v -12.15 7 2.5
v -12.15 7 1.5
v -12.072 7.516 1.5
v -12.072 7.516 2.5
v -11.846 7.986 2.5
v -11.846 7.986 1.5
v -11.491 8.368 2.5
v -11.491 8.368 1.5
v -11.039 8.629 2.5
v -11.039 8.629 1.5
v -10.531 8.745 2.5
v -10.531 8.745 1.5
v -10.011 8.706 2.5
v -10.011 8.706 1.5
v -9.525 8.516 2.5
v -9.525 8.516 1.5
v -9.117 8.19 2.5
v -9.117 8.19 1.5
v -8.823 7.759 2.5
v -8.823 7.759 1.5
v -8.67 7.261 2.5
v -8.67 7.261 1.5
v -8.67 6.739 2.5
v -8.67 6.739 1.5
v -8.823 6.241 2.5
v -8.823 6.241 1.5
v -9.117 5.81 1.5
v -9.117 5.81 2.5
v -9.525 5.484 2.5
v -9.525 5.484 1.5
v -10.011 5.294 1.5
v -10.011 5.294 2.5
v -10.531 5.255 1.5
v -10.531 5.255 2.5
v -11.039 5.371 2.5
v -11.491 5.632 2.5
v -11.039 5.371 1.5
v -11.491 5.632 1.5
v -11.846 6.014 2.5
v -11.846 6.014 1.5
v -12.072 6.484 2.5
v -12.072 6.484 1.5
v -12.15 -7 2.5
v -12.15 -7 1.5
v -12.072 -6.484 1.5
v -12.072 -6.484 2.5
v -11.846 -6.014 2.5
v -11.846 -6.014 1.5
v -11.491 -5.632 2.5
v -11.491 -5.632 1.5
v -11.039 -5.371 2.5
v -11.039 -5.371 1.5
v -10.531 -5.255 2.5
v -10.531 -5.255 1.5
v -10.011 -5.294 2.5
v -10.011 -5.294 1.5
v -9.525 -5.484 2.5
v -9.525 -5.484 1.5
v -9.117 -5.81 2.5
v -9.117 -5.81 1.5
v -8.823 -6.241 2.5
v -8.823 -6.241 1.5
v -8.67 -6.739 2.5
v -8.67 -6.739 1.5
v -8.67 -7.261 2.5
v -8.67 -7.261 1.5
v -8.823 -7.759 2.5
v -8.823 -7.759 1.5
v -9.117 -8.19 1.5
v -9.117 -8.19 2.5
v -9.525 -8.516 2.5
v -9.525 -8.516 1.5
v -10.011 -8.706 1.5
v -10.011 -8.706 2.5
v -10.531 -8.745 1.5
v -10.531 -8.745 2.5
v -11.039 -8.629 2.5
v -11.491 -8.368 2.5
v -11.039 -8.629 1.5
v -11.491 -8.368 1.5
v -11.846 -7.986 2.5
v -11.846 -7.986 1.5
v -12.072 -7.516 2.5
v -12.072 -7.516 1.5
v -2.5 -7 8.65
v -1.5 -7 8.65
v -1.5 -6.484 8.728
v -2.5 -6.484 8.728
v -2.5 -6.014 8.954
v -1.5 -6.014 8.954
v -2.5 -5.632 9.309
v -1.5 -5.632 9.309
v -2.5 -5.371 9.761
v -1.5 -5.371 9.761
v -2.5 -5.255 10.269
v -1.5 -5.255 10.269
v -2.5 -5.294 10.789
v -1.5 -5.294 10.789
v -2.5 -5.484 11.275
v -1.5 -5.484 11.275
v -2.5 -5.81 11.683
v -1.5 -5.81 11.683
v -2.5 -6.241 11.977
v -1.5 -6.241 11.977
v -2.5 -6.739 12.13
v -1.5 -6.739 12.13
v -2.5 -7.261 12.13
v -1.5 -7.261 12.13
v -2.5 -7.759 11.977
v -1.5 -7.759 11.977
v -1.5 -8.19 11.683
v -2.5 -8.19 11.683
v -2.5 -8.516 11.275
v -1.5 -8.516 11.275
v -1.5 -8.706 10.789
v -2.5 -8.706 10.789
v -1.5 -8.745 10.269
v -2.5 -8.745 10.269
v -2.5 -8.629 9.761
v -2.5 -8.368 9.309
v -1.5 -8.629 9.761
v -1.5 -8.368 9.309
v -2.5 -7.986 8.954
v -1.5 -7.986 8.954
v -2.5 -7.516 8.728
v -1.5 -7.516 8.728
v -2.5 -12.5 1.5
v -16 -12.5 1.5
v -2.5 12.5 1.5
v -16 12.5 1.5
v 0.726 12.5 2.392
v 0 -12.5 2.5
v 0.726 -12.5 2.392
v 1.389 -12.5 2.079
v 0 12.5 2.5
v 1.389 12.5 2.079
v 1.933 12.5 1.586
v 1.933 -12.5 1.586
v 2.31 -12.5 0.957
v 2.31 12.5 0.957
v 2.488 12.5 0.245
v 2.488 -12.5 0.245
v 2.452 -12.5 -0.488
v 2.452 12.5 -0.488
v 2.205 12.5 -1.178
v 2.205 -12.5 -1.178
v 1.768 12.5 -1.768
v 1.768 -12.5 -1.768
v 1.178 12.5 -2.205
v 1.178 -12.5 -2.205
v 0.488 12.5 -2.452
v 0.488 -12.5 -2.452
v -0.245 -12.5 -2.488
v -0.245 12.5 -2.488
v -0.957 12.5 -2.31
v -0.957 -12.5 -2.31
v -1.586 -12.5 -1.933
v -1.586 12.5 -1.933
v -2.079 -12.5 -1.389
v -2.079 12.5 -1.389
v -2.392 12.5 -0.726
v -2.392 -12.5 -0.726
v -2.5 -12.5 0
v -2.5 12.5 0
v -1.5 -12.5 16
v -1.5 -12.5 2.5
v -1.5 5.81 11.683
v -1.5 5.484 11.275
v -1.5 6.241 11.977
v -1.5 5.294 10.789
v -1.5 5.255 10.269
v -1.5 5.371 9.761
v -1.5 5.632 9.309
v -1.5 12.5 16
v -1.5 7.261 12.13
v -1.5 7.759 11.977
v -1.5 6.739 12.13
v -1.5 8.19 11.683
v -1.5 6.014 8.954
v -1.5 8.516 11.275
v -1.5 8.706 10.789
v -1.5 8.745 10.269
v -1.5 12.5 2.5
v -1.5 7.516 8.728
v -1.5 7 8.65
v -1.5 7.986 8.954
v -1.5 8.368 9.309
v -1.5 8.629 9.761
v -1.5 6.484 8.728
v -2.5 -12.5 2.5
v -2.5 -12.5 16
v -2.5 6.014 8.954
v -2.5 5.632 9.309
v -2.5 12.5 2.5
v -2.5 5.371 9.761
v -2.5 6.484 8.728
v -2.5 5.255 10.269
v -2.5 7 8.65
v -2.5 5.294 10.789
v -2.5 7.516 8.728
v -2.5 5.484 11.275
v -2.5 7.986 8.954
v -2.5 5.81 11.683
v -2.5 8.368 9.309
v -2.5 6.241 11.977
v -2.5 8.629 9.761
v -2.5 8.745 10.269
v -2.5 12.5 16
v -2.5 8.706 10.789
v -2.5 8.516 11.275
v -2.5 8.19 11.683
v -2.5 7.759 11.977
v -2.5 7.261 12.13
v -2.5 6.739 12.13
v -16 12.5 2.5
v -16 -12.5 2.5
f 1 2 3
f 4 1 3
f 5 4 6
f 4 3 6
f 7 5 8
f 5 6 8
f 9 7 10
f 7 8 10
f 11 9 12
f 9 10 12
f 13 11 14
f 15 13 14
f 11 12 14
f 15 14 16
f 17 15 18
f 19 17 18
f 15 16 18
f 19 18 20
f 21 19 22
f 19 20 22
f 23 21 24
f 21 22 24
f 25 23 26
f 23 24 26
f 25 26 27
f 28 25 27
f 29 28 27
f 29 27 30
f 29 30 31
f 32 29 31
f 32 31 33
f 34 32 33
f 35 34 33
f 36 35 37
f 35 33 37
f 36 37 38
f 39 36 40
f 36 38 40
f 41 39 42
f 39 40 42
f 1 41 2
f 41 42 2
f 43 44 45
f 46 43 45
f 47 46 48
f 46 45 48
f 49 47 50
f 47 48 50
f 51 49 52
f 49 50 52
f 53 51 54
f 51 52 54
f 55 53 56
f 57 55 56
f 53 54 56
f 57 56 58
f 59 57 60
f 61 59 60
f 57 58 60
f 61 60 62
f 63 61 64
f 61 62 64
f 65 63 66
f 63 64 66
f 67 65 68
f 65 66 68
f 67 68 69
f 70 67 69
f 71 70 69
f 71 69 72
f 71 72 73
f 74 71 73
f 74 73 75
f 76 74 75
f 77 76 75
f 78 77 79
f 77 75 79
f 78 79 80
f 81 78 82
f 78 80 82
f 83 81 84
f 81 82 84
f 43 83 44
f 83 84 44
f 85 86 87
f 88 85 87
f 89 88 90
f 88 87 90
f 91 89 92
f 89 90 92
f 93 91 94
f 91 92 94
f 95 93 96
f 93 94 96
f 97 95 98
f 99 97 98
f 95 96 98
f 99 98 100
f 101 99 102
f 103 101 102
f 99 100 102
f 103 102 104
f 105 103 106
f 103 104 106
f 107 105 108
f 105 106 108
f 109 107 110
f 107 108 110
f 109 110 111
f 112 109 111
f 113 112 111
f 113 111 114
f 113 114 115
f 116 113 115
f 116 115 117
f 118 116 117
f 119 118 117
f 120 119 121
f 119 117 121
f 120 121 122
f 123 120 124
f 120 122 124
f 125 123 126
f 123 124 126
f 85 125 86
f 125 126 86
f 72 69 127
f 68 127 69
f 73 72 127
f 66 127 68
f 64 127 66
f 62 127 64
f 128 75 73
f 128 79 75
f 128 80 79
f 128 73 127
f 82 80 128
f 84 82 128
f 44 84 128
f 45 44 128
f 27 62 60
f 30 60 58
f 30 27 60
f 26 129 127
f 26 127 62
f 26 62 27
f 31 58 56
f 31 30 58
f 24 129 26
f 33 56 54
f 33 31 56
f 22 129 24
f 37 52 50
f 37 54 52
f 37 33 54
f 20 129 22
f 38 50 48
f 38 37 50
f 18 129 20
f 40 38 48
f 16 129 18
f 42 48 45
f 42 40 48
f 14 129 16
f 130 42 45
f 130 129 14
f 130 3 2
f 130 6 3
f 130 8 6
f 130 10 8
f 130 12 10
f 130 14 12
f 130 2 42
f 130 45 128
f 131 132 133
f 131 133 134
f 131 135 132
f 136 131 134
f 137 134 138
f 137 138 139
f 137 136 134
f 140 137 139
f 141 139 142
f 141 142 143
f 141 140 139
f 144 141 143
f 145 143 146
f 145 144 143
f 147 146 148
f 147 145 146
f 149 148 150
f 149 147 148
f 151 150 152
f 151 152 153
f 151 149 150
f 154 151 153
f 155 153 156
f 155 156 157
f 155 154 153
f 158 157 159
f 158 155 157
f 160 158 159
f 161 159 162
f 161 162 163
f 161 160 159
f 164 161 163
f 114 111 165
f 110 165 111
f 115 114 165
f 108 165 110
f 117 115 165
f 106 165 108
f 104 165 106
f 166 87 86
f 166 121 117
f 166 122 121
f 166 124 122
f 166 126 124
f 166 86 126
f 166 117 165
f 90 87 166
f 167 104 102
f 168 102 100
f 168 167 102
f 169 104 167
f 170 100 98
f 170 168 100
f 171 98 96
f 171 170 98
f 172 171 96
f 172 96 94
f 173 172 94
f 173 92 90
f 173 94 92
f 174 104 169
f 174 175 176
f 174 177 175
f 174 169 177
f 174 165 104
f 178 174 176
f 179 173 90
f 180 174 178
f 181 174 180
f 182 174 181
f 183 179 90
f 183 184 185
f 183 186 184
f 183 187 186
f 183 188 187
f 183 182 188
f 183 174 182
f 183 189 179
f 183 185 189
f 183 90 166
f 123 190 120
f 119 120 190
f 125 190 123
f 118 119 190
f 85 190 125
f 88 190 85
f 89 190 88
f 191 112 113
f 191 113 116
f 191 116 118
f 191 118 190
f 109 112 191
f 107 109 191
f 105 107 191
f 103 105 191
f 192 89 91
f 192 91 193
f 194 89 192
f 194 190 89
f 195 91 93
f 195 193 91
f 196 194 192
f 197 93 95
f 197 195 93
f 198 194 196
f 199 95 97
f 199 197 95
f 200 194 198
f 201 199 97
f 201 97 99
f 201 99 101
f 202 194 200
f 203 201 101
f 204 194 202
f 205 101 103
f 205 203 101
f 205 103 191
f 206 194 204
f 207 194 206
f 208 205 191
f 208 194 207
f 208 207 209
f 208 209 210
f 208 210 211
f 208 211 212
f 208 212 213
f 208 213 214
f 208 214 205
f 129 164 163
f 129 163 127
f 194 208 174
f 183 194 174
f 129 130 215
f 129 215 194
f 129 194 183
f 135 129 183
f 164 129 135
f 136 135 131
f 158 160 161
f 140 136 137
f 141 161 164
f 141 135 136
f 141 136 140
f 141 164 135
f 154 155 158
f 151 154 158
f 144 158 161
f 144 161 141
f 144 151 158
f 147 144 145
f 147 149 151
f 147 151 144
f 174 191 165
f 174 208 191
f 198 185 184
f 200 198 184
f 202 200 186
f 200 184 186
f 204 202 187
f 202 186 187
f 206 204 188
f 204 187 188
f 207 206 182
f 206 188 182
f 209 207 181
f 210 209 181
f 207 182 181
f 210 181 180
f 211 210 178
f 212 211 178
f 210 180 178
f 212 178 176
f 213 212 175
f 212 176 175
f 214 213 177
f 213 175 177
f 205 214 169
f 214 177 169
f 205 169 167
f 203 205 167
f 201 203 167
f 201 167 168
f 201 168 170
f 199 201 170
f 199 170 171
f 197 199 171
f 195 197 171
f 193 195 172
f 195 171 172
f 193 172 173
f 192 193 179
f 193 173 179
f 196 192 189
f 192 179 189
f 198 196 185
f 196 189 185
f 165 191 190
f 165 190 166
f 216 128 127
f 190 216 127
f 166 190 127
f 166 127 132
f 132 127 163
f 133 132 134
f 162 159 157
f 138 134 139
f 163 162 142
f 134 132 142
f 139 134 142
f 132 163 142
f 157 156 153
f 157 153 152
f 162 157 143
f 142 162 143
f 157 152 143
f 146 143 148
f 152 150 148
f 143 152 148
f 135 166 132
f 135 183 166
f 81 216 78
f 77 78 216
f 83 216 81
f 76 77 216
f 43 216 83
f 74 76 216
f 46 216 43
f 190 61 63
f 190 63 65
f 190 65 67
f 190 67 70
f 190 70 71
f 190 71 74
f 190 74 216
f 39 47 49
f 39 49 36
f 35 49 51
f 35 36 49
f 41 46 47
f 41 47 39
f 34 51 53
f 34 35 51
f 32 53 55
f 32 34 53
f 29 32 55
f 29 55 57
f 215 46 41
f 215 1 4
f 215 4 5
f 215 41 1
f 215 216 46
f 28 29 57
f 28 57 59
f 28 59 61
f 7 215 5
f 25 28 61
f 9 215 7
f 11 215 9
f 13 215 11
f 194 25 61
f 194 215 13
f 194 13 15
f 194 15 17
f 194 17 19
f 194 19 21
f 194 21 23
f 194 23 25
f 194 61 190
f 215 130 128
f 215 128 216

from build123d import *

# Parameters (mm, degrees)
EXTRUDE_1_DEPTH     = 12.5
SKETCH_4_R          = 2.121320344
EXTRUDE_3_DEPTH     = 25
SKETCH_5_R          = 1.75
CUT_EXTRUDE_1_DEPTH = 1
SKETCH_6_R          = 1.75
CUT_EXTRUDE_2_DEPTH = 1


with BuildPart() as part:
    # 草图1 → 凸台-拉伸1 (new, symmetric)
    with BuildSketch(Plane(origin=(0, 0, 0), x_dir=(1, 0, 0), z_dir=(0, 1, 0))):
        with BuildLine():
            ThreePointArc((0, -2.5), (1.767766953, 1.767766953), (-2.5, 0))
            Line((-2.5, 0), (-2.5, -1.5))
            Line((-2.5, -1.5), (-16, -1.5))
            Line((-16, -1.5), (-16, -2.5))
            Line((-16, -2.5), (-2.5, -2.5))
            Line((-2.5, -2.5), (-2.5, -16))
            Line((-2.5, -16), (-1.5, -16))
            Line((-1.5, -16), (-1.5, -2.5))
            Line((-1.5, -2.5), (0, -2.5))
        make_face()
        with BuildLine():
            ThreePointArc((-1.5, 0), (1.060660172, 1.060660172), (0, -1.5))
            Line((0, -1.5), (-1.5, -1.5))
            Line((-1.5, -1.5), (-1.5, 0))
        make_face(mode=Mode.SUBTRACT)
    extrude(amount=EXTRUDE_1_DEPTH, both=True)

    # 草图4 → 凸台-拉伸3 (add)
    with BuildSketch(Plane(origin=(0, 12.5, 0), x_dir=(1, 0, 0), z_dir=(0, 1, 0))):
        Circle(SKETCH_4_R)
    extrude(amount=-EXTRUDE_3_DEPTH)

    # 草图5 → 切除-拉伸1 (cut)
    with BuildSketch(Plane(origin=(0, 0, 1.5), x_dir=(-1, 0, 0), z_dir=(0, 0, -1))):
        with Locations((10.4, -7)):
            Circle(SKETCH_5_R)
        with Locations((10.4, 7)):
            Circle(SKETCH_5_R)
    extrude(amount=-CUT_EXTRUDE_1_DEPTH, mode=Mode.SUBTRACT)

    # 草图6 → 切除-拉伸2 (cut)
    with BuildSketch(Plane(origin=(-1.5, 0, 0), x_dir=(0, 0, -1), z_dir=(1, 0, 0))):
        with Locations((-10.4, -7)):
            Circle(SKETCH_6_R)
        with Locations((-10.4, 7)):
            Circle(SKETCH_6_R)
    extrude(amount=-CUT_EXTRUDE_2_DEPTH, mode=Mode.SUBTRACT)


solid = part.part
